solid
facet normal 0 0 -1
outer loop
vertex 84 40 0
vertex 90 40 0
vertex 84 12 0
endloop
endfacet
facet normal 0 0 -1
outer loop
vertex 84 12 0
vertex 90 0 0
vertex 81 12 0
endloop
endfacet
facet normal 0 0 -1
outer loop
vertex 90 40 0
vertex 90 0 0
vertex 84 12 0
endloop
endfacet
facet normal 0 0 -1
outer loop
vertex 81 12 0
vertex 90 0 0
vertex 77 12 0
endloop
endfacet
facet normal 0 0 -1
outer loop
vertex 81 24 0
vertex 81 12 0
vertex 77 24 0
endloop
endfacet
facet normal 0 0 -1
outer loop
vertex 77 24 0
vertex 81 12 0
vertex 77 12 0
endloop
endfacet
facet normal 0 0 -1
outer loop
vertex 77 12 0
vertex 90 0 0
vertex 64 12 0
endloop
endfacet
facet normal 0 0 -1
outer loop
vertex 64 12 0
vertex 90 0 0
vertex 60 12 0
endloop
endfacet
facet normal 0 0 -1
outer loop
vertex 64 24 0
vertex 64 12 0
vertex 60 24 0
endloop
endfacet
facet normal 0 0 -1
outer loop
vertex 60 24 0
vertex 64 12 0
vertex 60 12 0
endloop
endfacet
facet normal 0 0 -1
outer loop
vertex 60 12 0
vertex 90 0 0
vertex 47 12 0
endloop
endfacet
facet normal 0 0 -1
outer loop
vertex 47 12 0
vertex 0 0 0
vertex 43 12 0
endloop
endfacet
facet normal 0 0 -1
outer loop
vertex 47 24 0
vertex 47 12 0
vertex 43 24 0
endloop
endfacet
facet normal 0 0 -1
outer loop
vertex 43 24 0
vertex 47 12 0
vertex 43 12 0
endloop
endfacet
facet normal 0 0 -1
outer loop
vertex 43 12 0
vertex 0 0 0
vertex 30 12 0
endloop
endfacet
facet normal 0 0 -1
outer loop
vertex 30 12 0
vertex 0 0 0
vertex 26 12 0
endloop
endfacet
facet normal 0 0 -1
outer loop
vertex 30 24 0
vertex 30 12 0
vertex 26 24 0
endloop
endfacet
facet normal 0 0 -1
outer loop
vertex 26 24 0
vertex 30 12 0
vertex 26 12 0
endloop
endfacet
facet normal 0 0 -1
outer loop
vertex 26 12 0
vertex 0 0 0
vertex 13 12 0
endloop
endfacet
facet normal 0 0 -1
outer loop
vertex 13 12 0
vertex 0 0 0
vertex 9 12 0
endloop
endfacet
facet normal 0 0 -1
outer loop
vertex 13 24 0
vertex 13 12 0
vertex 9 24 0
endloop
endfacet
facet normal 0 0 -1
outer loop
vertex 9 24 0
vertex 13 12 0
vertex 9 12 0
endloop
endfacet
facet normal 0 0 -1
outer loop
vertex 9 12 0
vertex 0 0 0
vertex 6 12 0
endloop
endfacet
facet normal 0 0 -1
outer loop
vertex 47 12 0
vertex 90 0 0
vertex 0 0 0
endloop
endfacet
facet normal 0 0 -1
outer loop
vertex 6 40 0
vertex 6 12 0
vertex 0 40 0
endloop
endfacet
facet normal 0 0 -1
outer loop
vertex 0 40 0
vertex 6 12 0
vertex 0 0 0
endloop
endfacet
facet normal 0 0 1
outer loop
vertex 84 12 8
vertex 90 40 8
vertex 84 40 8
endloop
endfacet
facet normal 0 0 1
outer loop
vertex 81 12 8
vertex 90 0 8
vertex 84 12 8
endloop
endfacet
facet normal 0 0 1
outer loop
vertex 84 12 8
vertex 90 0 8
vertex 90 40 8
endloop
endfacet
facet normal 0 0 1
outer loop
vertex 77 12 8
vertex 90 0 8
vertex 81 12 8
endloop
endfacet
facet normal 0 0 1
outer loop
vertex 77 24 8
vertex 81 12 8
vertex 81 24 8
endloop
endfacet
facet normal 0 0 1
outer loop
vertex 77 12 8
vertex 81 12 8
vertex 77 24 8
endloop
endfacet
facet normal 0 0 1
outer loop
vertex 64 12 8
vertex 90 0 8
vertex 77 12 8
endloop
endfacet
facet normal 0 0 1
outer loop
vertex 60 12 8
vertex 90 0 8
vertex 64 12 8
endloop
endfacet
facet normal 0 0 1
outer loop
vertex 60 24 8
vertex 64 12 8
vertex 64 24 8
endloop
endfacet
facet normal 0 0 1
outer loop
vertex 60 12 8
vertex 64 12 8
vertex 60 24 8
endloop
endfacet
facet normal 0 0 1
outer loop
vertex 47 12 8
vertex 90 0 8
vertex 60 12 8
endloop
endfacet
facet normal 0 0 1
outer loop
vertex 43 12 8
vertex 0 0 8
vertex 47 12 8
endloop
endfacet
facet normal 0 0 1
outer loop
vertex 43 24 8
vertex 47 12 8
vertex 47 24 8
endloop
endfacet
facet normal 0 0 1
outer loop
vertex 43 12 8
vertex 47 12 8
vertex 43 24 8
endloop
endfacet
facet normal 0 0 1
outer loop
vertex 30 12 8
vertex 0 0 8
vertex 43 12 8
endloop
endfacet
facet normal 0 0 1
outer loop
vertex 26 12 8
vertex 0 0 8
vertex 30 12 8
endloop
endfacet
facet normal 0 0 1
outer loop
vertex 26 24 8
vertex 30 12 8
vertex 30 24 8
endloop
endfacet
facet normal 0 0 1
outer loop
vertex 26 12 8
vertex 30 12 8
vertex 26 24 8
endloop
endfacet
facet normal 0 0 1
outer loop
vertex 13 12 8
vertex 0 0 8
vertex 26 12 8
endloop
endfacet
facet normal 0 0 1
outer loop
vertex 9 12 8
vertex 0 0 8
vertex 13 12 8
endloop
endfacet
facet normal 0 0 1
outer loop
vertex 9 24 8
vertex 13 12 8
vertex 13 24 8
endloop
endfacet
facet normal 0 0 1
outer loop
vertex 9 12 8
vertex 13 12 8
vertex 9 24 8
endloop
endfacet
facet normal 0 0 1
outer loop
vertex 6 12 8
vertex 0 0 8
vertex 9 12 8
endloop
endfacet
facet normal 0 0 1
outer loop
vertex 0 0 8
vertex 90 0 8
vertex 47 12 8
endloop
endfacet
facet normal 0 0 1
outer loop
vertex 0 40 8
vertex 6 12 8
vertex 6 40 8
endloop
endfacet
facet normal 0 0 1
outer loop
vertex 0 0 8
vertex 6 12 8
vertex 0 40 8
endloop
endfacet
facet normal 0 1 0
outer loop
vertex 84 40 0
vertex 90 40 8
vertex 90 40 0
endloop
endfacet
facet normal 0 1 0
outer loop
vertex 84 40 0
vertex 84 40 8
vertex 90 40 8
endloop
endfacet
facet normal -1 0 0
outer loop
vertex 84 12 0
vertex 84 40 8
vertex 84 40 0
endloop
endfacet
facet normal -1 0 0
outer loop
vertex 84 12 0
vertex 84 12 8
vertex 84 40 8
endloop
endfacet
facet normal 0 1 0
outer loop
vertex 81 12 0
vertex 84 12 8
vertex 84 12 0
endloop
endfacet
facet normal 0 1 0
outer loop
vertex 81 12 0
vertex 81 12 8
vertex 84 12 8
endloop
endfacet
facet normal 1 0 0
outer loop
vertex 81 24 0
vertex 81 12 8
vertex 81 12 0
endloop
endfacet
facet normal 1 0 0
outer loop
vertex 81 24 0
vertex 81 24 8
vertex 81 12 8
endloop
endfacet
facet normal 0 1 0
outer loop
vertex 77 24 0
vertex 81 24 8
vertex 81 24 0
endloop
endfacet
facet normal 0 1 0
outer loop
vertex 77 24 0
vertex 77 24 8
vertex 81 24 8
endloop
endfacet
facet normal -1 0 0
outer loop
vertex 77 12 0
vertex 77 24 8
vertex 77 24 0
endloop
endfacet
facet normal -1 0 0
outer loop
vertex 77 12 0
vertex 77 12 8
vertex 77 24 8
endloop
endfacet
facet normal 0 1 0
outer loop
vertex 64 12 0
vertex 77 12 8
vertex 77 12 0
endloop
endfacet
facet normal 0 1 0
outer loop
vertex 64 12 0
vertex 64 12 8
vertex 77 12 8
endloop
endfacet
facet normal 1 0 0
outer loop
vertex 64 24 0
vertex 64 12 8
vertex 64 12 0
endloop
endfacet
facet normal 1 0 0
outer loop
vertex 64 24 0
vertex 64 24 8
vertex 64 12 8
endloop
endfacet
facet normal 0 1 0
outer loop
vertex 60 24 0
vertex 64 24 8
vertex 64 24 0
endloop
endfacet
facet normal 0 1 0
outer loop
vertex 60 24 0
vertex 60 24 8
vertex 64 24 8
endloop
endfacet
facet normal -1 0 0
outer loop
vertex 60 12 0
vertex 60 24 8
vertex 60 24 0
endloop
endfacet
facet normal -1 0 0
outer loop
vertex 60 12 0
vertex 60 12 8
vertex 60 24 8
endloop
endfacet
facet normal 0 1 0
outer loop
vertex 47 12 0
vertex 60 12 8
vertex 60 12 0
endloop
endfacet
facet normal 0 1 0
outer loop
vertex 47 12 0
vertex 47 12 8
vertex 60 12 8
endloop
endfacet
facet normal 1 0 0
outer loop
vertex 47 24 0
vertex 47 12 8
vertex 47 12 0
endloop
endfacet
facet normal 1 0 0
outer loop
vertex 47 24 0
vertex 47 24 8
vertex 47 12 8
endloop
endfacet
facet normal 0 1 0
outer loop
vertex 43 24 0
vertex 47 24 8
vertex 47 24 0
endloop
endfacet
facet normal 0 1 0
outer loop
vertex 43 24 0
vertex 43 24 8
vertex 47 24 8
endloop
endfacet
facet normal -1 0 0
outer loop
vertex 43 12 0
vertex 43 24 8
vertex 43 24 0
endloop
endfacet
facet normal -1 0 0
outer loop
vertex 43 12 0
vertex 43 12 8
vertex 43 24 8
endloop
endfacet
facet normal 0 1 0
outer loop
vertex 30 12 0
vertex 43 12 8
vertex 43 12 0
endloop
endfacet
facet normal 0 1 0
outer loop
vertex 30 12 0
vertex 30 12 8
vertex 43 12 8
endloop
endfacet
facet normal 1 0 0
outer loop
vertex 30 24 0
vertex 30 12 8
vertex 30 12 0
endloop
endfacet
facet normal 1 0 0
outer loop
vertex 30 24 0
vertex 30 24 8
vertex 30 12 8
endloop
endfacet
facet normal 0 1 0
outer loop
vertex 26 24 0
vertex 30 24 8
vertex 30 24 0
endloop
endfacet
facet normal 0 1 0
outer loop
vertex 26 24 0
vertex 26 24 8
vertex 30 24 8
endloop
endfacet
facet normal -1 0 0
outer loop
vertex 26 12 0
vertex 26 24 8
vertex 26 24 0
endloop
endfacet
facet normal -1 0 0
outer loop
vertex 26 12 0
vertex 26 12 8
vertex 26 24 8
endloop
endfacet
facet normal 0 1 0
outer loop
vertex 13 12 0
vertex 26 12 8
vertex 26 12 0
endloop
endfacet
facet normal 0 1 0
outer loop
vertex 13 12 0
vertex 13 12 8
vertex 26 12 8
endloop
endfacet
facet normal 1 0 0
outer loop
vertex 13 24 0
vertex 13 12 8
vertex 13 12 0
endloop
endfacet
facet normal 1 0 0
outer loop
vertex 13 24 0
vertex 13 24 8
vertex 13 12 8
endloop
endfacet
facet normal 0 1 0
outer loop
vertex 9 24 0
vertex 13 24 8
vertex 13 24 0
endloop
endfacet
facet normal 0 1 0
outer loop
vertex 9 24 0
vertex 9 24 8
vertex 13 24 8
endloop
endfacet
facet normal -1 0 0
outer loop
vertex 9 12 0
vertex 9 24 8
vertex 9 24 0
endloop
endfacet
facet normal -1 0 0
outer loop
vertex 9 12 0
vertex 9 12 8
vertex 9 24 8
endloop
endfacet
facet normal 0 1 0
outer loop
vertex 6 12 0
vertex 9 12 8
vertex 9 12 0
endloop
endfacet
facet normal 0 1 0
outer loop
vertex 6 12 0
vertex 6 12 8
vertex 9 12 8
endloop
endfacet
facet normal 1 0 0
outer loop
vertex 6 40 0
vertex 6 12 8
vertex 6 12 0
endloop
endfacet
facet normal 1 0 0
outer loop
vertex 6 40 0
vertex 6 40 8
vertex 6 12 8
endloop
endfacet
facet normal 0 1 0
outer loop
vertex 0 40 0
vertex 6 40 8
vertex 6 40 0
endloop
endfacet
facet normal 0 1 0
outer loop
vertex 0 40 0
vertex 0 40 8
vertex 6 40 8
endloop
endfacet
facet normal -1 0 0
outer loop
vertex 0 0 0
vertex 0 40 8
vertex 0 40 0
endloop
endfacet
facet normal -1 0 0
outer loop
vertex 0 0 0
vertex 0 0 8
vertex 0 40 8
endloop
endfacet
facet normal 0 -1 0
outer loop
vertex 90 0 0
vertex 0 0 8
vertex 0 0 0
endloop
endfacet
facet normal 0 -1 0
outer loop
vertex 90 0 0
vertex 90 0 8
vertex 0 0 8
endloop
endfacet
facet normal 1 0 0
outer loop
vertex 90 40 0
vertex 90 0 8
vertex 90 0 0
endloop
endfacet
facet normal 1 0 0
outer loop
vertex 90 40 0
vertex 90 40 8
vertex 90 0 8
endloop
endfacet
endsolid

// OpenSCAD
$fn = 32;

// ----------------------------------------------------------------------
// Guard grille: 5 slats over a 90 x 40 mm plate
// ----------------------------------------------------------------------

// --- parameters (mm) ---
profile_height = 8;       // extrusion height
profile_points = 28;      // points of the closed outline

profile = [[0, 0], [90, 0], [90, 40], [84, 40], [84, 12], [81, 12], [81, 24], [77, 24], [77, 12], [64, 12], [64, 24], [60, 24], [60, 12], [47, 12], [47, 24], [43, 24], [43, 12], [30, 12], [30, 24], [26, 24], [26, 12], [13, 12], [13, 24], [9, 24], [9, 12], [6, 12], [6, 40], [0, 40]];  // single closed polygon, 28 points, counter clockwise

// --- the one profile operation ---
linear_extrude(height = profile_height) polygon(points = profile);
